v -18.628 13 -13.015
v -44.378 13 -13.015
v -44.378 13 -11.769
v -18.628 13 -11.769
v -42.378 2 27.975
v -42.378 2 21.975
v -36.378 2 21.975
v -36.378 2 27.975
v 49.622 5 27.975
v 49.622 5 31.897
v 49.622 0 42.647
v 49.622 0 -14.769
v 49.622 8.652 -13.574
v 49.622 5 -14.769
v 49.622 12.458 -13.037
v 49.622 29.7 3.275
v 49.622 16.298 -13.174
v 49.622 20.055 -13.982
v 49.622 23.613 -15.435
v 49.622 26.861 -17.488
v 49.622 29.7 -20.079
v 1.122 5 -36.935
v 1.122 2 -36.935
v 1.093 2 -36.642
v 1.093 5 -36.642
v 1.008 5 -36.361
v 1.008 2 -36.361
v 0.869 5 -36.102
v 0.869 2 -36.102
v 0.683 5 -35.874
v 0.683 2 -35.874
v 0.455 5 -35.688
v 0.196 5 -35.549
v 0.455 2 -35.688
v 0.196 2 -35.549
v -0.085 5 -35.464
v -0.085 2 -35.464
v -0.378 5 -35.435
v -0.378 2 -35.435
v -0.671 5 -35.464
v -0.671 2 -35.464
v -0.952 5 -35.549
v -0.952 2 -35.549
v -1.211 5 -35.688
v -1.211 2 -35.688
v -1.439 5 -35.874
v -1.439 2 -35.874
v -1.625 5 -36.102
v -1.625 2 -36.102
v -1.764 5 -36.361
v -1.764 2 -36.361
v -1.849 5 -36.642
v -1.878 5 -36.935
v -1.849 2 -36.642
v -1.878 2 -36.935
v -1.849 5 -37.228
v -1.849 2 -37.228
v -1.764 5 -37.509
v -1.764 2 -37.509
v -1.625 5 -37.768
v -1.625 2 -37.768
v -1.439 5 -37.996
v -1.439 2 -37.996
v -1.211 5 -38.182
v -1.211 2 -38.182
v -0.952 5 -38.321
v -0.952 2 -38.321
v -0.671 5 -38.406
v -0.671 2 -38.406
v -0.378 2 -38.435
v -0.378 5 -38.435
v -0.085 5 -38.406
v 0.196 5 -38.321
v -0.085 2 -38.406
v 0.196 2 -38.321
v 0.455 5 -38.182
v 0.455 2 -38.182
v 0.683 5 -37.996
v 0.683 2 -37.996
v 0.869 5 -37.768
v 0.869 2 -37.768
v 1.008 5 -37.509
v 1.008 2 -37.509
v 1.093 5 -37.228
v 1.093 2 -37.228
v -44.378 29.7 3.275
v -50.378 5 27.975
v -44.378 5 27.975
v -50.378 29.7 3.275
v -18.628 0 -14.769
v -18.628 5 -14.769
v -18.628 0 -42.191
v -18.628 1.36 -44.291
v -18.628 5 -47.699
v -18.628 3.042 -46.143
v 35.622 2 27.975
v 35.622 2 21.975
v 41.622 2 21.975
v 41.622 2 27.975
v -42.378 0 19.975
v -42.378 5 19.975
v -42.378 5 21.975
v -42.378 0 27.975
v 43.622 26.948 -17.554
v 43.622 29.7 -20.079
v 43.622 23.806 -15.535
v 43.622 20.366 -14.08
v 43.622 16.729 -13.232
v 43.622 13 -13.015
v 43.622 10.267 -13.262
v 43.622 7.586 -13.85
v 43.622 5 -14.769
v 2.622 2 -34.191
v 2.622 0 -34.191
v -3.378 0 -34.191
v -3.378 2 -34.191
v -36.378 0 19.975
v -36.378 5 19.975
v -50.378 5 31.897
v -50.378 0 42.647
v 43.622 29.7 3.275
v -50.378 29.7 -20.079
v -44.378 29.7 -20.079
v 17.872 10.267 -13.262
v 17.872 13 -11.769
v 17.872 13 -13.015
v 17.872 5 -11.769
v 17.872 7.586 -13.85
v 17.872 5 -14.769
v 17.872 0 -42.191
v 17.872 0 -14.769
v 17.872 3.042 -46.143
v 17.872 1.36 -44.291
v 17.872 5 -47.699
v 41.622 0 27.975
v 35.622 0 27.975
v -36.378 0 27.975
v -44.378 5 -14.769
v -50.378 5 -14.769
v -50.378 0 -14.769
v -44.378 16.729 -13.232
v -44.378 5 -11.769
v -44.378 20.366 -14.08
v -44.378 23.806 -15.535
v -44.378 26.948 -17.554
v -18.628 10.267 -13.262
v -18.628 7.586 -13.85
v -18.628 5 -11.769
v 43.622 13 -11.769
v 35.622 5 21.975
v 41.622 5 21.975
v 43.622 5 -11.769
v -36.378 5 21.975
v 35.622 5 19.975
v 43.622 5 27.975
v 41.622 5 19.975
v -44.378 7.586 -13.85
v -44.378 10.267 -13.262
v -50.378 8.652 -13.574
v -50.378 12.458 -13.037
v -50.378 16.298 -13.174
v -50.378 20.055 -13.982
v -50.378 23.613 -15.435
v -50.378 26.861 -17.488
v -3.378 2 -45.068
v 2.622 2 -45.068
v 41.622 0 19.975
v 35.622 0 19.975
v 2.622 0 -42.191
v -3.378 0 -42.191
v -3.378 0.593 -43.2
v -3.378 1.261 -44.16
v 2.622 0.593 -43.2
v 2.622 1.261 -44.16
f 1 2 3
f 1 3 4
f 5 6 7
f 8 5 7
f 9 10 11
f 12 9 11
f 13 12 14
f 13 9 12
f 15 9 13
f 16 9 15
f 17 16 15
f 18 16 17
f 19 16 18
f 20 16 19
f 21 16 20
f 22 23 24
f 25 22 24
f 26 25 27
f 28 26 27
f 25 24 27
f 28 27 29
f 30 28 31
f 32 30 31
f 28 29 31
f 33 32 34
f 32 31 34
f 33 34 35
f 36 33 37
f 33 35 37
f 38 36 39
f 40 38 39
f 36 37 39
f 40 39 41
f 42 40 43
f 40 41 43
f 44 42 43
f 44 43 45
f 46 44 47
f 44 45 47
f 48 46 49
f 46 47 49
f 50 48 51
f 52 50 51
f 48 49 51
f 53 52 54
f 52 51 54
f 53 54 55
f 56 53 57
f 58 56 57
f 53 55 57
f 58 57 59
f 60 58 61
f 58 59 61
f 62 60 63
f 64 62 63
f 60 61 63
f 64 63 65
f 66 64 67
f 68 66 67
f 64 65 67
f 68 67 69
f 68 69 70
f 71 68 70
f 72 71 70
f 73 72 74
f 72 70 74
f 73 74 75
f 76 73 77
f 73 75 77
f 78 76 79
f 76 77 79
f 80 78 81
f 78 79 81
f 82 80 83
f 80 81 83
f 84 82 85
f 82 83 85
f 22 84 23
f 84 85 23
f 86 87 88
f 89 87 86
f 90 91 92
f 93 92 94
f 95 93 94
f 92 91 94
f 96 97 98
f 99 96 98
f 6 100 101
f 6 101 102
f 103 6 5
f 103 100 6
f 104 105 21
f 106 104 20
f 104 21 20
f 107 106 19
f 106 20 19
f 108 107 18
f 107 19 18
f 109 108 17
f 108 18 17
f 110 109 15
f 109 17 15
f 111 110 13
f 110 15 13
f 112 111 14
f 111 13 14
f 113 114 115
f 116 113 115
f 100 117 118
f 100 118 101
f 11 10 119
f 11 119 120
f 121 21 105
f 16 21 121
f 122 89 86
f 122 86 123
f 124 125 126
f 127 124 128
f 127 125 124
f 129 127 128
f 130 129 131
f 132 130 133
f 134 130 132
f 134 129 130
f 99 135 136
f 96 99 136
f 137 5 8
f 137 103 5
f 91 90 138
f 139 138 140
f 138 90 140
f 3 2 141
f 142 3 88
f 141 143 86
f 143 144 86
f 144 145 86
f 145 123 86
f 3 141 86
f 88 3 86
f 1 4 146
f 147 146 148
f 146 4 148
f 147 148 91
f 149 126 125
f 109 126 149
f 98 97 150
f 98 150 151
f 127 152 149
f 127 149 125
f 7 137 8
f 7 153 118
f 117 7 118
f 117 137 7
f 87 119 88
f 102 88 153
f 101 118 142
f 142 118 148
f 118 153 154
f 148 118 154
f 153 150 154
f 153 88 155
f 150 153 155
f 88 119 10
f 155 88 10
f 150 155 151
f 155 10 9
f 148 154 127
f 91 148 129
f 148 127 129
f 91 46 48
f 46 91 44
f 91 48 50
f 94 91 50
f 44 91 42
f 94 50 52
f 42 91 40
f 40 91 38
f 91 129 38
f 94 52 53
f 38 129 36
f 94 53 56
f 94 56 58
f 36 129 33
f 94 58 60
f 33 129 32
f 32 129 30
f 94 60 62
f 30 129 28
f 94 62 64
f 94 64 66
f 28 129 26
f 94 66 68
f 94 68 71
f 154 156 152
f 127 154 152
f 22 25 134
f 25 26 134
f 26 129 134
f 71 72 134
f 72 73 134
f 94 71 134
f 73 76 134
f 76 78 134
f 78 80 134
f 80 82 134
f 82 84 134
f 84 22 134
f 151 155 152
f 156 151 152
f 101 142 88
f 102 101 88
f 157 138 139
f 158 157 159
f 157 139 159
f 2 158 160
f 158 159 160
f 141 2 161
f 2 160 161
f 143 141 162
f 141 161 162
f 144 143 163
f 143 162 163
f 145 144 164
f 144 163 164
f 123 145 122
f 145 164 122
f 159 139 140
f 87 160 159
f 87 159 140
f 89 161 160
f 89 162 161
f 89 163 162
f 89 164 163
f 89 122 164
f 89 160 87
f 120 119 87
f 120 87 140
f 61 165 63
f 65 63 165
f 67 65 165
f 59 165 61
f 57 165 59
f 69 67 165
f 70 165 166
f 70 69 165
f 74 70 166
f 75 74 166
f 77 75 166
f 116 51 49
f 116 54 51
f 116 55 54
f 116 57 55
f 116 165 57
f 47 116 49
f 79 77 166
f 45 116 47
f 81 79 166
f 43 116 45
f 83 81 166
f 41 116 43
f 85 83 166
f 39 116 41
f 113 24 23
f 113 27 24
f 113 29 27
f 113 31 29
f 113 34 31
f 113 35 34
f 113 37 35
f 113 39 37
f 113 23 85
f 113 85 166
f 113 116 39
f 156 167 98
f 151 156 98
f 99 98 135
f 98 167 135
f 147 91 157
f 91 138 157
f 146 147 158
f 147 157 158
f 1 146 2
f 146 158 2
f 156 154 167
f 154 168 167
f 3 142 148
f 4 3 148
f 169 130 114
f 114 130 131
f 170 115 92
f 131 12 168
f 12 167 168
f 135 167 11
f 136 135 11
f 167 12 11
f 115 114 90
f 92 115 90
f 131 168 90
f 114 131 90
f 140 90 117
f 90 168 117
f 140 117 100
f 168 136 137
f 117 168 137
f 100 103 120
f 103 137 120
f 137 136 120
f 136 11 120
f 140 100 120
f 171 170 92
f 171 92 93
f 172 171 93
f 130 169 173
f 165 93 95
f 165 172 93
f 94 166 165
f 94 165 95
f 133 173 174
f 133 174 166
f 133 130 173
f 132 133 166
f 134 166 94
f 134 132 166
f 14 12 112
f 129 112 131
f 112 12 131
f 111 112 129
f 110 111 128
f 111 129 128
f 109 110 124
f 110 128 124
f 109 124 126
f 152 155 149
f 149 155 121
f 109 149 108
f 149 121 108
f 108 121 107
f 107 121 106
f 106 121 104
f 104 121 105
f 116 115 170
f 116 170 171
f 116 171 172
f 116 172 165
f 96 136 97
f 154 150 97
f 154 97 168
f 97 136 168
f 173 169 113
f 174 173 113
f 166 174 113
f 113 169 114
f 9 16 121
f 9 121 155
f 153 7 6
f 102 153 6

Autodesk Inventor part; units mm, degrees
ref_plane "YZ Plane" through (0, 0, 0) normal (1, 0, 0) x (0, 1, 0)
ref_plane "XZ Plane" through (0, 0, 0) normal (0, 1, 0) x (-1, 0, 0)
ref_plane "XY Plane" through (0, 0, 0) normal (0, 0, 1) x (1, 0, 0)
sketch "Sketch1" plane through (0, 0, 0) normal (0, 1, 0) x (-1, 0, 0)
  line L0 (-49.6221, -50.9693) -> (50.3779, -50.9693)
  line L1 (50.3779, -50.9693) -> (50.3779, 49.0307)
  line L2 (50.3779, 49.0307) -> (-49.6221, 49.0307)
  line L3 (-49.6221, 49.0307) -> (-49.6221, -50.9693)
  line L4 (-17.8721, -0.5117) -> (18.6279, -0.5117)
  line L5 (18.6279, -0.5117) -> (18.6279, -50.9693)
  line L6 (18.6279, -50.9693) -> (-17.8721, -50.9693)
  line L7 (-17.8721, -50.9693) -> (-17.8721, -0.5117)
  line L8 (-49.6221, -18.7693) -> (50.3779, -18.7693)
  line L9 (50.3779, -18.7693) -> (50.3779, -50.9693)
  line L10 (50.3779, -50.9693) -> (-49.6221, -50.9693)
  line L11 (-49.6221, -50.9693) -> (-49.6221, -18.7693)
  line L12 (-49.6221, -18.7693) -> (50.3779, -18.7693)
  line L13 (50.3779, -18.7693) -> (50.3779, -14.7693)
  line L14 (50.3779, -14.7693) -> (-49.6221, -14.7693)
  line L15 (-49.6221, -14.7693) -> (-49.6221, -18.7693)
  line L16 (-49.6221, -34.8693) -> (50.3779, -34.8693)
  line L17 (-49.6221, -50.9693) -> (50.3779, -50.9693)
  line L18 (50.3779, -50.9693) -> (50.3779, -46.9693)
  line L19 (50.3779, -46.9693) -> (-49.6221, -46.9693)
  line L20 (-49.6221, -46.9693) -> (-49.6221, -50.9693)
  point P0 (0, 0)
  point P1 (0.3779, -50.9693)
  point P2 (0.3779, -50.9693)
  point P3 (0.3779, -50.9693)
  point P4 (-49.6221, -14.7693)
  point P5 (-17.8721, -14.7693)
  point P6 (-17.8721, -46.9693)
  point P7 (18.6279, -46.9693)
  point P8 (18.6279, -14.7693)
  dimension "d0" = 100
  dimension "d1" = 100
  dimension "d2" = 36.5
  dimension "d3" = 100
  dimension "d4" = 32.2
  dimension "d5" = 4
  dimension "d6" = 4
extrude "Extrusion1" add sketch "Sketch1" along normal blind 4 contours L7 L16 L5 L19 | L7 L8 L5 L16 | L7 L14 L5 L8 | L3 L2 L1 L14 L5 L4 L7 | L7 L4 L5 L14
sketch "Sketch2" plane through (17.8721, 0, -14.7693) normal (1, 0, 0) x (0, 0, -1)
  line L0 (0, 0) -> (32.2, 0) projected
  line L1 (32.2, 0) -> (32.2, 4) projected
  line L2 (0, 4) -> (32.2, 4) projected
  line L3 (0, 0) -> (0, 4) projected
  circle A0 centre (20.1, 13.6) radius 16.1 projected
  line L4 (32.2, 0) -> (32.2, 4) projected
  circle A1 centre (20.1, 13.6) radius 15.4457
  point P0 (-14.7693, 0)
  point P1 (27.4219, 0)
extrude "Extrusion2" cut sketch "Sketch2" against normal through all contours A0 L1 L0 | L0 A1 L1 A0
sketch "Sketch3" plane through (0, 0, 0) normal (0, -1, 0) x (1, 0, 0)
  line L0 (-18.6279, -46.9693) -> (-18.6279, -42.1911) projected
  line L1 (17.8721, -46.9693) -> (-18.6279, -46.9693) projected
  line L2 (17.8721, -42.1911) -> (17.8721, -46.9693) projected
  line L3 (-18.6279, -42.1911) -> (17.8721, -42.1911) projected
  line L4 (-18.6279, -42.1911) -> (17.8721, -42.1911) projected
  line L5 (17.8721, -14.7693) -> (17.8721, -42.1911) projected
  line L6 (49.6221, -14.7693) -> (17.8721, -14.7693) projected
  line L7 (49.6221, 49.0307) -> (49.6221, -14.7693) projected
  line L8 (-50.3779, 49.0307) -> (49.6221, 49.0307) projected
  line L9 (-50.3779, -14.7693) -> (-50.3779, 49.0307) projected
  line L10 (-18.6279, -14.7693) -> (-50.3779, -14.7693) projected
  line L11 (-18.6279, -42.1911) -> (-18.6279, -14.7693) projected
  line L12 (17.8721, -46.9693) -> (-18.6279, -46.9693) projected
  line L13 (-18.6279, -42.1911) -> (17.8721, -42.1911) projected
  line L14 (2.6221, -34.1911) -> (-3.3779, -34.1911)
  line L15 (-3.3779, -34.1911) -> (-3.3779, -42.1911)
  line L16 (-3.3779, -42.1911) -> (2.6221, -42.1911)
  line L17 (2.6221, -42.1911) -> (2.6221, -34.1911)
  line L18 (2.6221, -42.1911) -> (-3.3779, -42.1911)
  line L19 (-3.3779, -42.1911) -> (-3.3779, -53.2472)
  line L20 (-3.3779, -53.2472) -> (2.6221, -53.2472)
  line L21 (2.6221, -53.2472) -> (2.6221, -42.1911)
  point P0 (0, 0)
  point P1 (-0.3779, -46.9693)
  point P2 (-0.3779, -42.1911)
  point P3 (-0.3779, -42.1911)
  dimension "d11" = 6
  dimension "d12" = 8
extrude "Extrusion3" cut sketch "Sketch3" against normal blind 2 contours L19 L3 L21 L1 | L1 L21 L20 L19 | L15 L14 L17 L3
sketch "Sketch4" plane through (0, 4, 0) normal (0, 1, 0) x (1, 0, 0)
  line L0 (49.6221, -49.0307) -> (49.6221, 14.7693) projected
  line L1 (49.6221, 14.7693) -> (17.8721, 14.7693) projected
  line L2 (17.8721, 14.7693) -> (17.8721, 46.9693) projected
  line L3 (17.8721, 46.9693) -> (-18.6279, 46.9693) projected
  line L4 (-18.6279, 46.9693) -> (-18.6279, 14.7693) projected
  line L5 (-18.6279, 14.7693) -> (-50.3779, 14.7693) projected
  line L6 (-50.3779, 14.7693) -> (-50.3779, -49.0307) projected
  line L7 (-50.3779, -49.0307) -> (49.6221, -49.0307) projected
  point P0 (0, 0)
extrude "Extrusion4" add sketch "Sketch4" along normal blind 1
sketch "Sketch5" plane through (17.8721, 0, -14.7693) normal (1, 0, 0) x (0, 0, -1)
  arc A0 (27.4219, 0) -> (32.2, 4) centre (20.1, 13.6) ccw projected
  arc A1 (27.4219, 0) -> (32.2, 4) centre (20.1, 13.6) ccw projected
  circle A2 centre (20.1, 13.6) radius 15.4457
  arc A3 (27.4219, 0) -> (32.2, 4) centre (20.1, 13.6) ccw projected
  line L0 (32.2, 4) -> (32.2, 5) projected
  line L1 (0, 5) -> (32.2, 5) projected
  line L2 (0, 0) -> (0, 5) projected
  line L3 (0, 0) -> (27.4219, 0) projected
  line L4 (32.2, 5) -> (32.93, 5)
  point P0 (-14.7693, 0)
  point P1 (32.2, 4)
extrude "Extrusion5" add sketch "Sketch5" against normal up to surface (36.5 mm away) contours L0 L4 A2
sketch "Sketch6" plane through (0, 2, 0) normal (0, -1, 0) x (1, 0, 0)
  line L0 (2.6221, -45.0678) -> (-3.3779, -45.0678) projected
  line L1 (2.6221, -34.1911) -> (2.6221, -45.0678) projected
  line L2 (-3.3779, -34.1911) -> (2.6221, -34.1911) projected
  line L3 (-3.3779, -45.0678) -> (-3.3779, -34.1911) projected
  line L4 (-3.3779, -34.1911) -> (2.6221, -34.1911) projected
  line L5 (-0.3779, -34.1911) -> (-0.3779, -35.8821)
  line L6 (-0.3779, -34.1911) -> (-0.3779, -36.935)
  circle A0 centre (-0.3779, -36.935) radius 1.5
  point P0 (0, 0)
  dimension "d19" = 3
extrude "Extrusion6" cut sketch "Sketch6" against normal blind 10 contours A0
sketch "Sketch7" plane through (49.6221, 0, 49.0307) normal (1, 0, 0) x (0, 0, -1)
  circle A0 centre (83.9, 13.6) radius 16.1 projected
  line L0 (0, 0) -> (63.8, 0) projected
  line L1 (63.8, 0) -> (63.8, 5) projected
  line L2 (0, 5) -> (63.8, 5) projected
  line L3 (0, 0) -> (0, 5) projected
  arc A1 (91.2219, 0) -> (96.73, 5) centre (83.9, 13.6) ccw projected
  line L4 (63.8, 5) -> (96.73, 5) projected
  line L5 (63.8, 0) -> (63.8, 5) projected
  line L6 (63.8, 0) -> (91.2219, 0) projected
  line L7 (0, 0) -> (63.8, 0) projected
  line L8 (0, 0) -> (0, -14.6713)
  line L9 (83.9, -2.5) -> (-11.8385, -2.5)
  line L10 (91.2219, 0) -> (63.8, 0) projected
  line L11 (3.6899, -2.5) -> (17.1336, 5)
  line L12 (0, 5) -> (63.8, 5) projected
  line L13 (17.1336, 5) -> (28.2336, 16.1)
  line L14 (17.1336, 5) -> (32.8313, 5) construction
  line L15 (28.2336, 16.1) -> (29.6478, 14.6857)
  line L16 (29.6478, 14.6857) -> (19.962, 5)
  line L17 (83.9, 29.7) -> (9.0674, 29.7)
  line L18 (29.6478, 14.6857) -> (44.662, 29.7)
  line L19 (63.8, 5) -> (96.73, 5) projected
  circle A2 centre (83.9, 13.6) radius 21.8625
  line L20 (17.1336, 5) -> (1.0083, -2.5)
  point P0 (49.0307, 0)
  point P1 (6.3834, 0)
  dimension "d22" = 45
  dimension "d23" = 2
extrude "Extrusion7" cut sketch "Sketch7" against normal through all contours L20 L0 L3 L2
sketch "Sketch8" plane through (49.6221, 0, -14.7693) normal (1, 0, 0) x (0, 0, -1)
  line L0 (-46.6664, 5) -> (-57.4166, 0) projected
  line L1 (-57.4166, 0) -> (0, 0) projected
  line L2 (0, 0) -> (0, 5) projected
  line L3 (-46.6664, 5) -> (0, 5) projected
  line L4 (0, 5) -> (-46.6664, 5) projected
  line L5 (-45.5728, 5) -> (-39.1497, 11.4231)
  line L6 (-45.5728, 5) -> (-36.4892, 5) construction
  line L7 (-39.1497, 11.4231) -> (-37.7355, 10.0089)
  line L8 (-37.7355, 10.0089) -> (-42.7444, 5)
  line L9 (-42.7444, 5) -> (-5.7272, 42.0172)
  circle A0 centre (20.1, 13.6) radius 16.1 projected
  line L10 (20.1, 29.7) -> (-35.8827, 29.7)
  line L11 (32.93, 5) -> (0, 5) projected
  circle A1 centre (20.1, 13.6) radius 21.8625
  point P0 (-14.7693, 0)
  point P1 (5.3095, 29.7)
  point P2 (-18.0444, 29.7)
  dimension "d26" = 45
  dimension "d27" = 2
extrude "Extrusion8" add sketch "Sketch8" against normal blind 6 contours L8 L9 L10 A1 L3
sketch "Sketch9" plane through (-50.3779, 0, -14.7693) normal (-1, 0, 0) x (0, 0, 1)
  line L0 (57.4166, 0) -> (46.6664, 5) projected
  line L1 (0, 5) -> (46.6664, 5) projected
  line L2 (0, 0) -> (0, 5) projected
  line L3 (0, 0) -> (57.4166, 0) projected
  line L4 (18.0444, 29.7) -> (-5.3095, 29.7) projected
  arc A0 (0, 5) -> (-5.3095, 29.7) centre (-20.1, 13.6) ccw projected
  line L5 (42.7444, 5) -> (0, 5) projected
  line L6 (42.7444, 5) -> (18.0444, 29.7) projected
  point P0 (14.7693, 0)
extrude "Extrusion9" add sketch "Sketch9" against normal blind 6 contours L1 A0 L4 L6
sketch "Sketch10" plane through (0, 5, 0) normal (0, 1, 0) x (1, 0, 0)
  line L0 (-44.3779, -27.9751) -> (-50.3779, -27.9751) projected
  line L1 (-50.3779, -27.9751) -> (-50.3779, -31.8971) projected
  line L2 (-50.3779, -31.8971) -> (49.6221, -31.8971) projected
  line L3 (49.6221, -31.8971) -> (49.6221, -27.9751) projected
  line L4 (49.6221, -27.9751) -> (43.6221, -27.9751) projected
  line L5 (43.6221, -27.9751) -> (43.6221, 14.7693) projected
  line L6 (43.6221, 14.7693) -> (17.8721, 14.7693) projected
  line L7 (17.8721, 14.7693) -> (17.8721, 47.6993) projected
  line L8 (17.8721, 47.6993) -> (-18.6279, 47.6993) projected
  line L9 (-18.6279, 47.6993) -> (-18.6279, 14.7693) projected
  line L10 (-18.6279, 14.7693) -> (-44.3779, 14.7693) projected
  line L11 (-44.3779, 14.7693) -> (-44.3779, -27.9751) projected
  circle A0 centre (-0.3779, 36.935) radius 1.5 projected
  line L12 (43.6221, -27.9751) -> (43.6221, 14.7693) projected
  line L13 (17.8721, 14.7693) -> (43.6221, 14.7693)
  line L14 (43.6221, 14.7693) -> (43.6221, 11.7693)
  line L15 (43.6221, 11.7693) -> (17.8721, 11.7693)
  line L16 (17.8721, 11.7693) -> (17.8721, 14.7693)
  line L17 (-44.3779, 14.7693) -> (-44.3779, -27.9751) projected
  line L18 (-18.6279, 14.7693) -> (-44.3779, 14.7693)
  line L19 (-44.3779, 14.7693) -> (-44.3779, 11.7693)
  line L20 (-44.3779, 11.7693) -> (-18.6279, 11.7693)
  line L21 (-18.6279, 11.7693) -> (-18.6279, 14.7693)
  point P0 (0, 0)
  dimension "d32" = 3
  dimension "d33" = 3
extrude "Extrusion10" add sketch "Sketch10" along normal blind 8 contours L11 L10 L21 L20 | L15 L16 L6 L5
sketch "Sketch11" plane through (-50.3779, 0, -14.7693) normal (-1, 0, 0) x (0, 0, 1)
  arc A0 (0, 5) -> (1.7543, 13) centre (-20.1, 13.6) ccw projected
  line L0 (0, 13) -> (1.7543, 13) projected
  line L1 (0, 5) -> (0, 13) projected
  point P0 (14.7693, 0)
extrude "Extrusion11" cut sketch "Sketch11" against normal through all
sketch "Sketch12" plane through (0, 0, 0) normal (0, -1, 0) x (1, 0, 0)
  line L0 (49.6221, 42.6473) -> (-50.3779, 42.6473) projected
  line L1 (-50.3779, -14.7693) -> (-50.3779, 42.6473) projected
  line L2 (-18.6279, -14.7693) -> (-50.3779, -14.7693) projected
  line L3 (-18.6279, -42.1911) -> (-18.6279, -14.7693) projected
  line L4 (-18.6279, -42.1911) -> (-3.3779, -42.1911) projected
  line L5 (-3.3779, -42.1911) -> (-3.3779, -34.1911) projected
  line L6 (-3.3779, -34.1911) -> (2.6221, -34.1911) projected
  line L7 (2.6221, -34.1911) -> (2.6221, -42.1911) projected
  line L8 (2.6221, -42.1911) -> (17.8721, -42.1911) projected
  line L9 (17.8721, -14.7693) -> (17.8721, -42.1911) projected
  line L10 (49.6221, -14.7693) -> (17.8721, -14.7693) projected
  line L11 (49.6221, 42.6473) -> (49.6221, -14.7693) projected
  circle A0 centre (-0.3779, -36.935) radius 1.5 projected
  line L12 (17.8721, -14.7693) -> (17.8721, -47.6993) projected
  line L13 (17.8721, -47.6993) -> (-18.6279, -47.6993) projected
  line L14 (-18.6279, -47.6993) -> (-18.6279, -14.7693) projected
  line L15 (-18.6279, -14.7693) -> (-18.6279, -11.7693) projected
  line L16 (-18.6279, -11.7693) -> (-44.3779, -11.7693) projected
  line L17 (-44.3779, -11.7693) -> (-44.3779, 27.9751) projected
  line L18 (-44.3779, 27.9751) -> (-50.3779, 27.9751) projected
  line L19 (-50.3779, 27.9751) -> (-50.3779, 31.8971) projected
  line L20 (-50.3779, 31.8971) -> (49.6221, 31.8971) projected
  line L21 (49.6221, 31.8971) -> (49.6221, 27.9751) projected
  line L22 (49.6221, 27.9751) -> (43.6221, 27.9751) projected
  line L23 (43.6221, 27.9751) -> (43.6221, -11.7693) projected
  line L24 (43.6221, -11.7693) -> (17.8721, -11.7693) projected
  line L25 (17.8721, -11.7693) -> (17.8721, -14.7693) projected
  line L26 (-44.3779, -11.7693) -> (-44.3779, 27.9751) projected
  line L27 (-44.3779, 27.9751) -> (-42.3779, 27.9751)
  line L28 (-42.3779, 27.9751) -> (-36.3779, 27.9751)
  line L29 (-36.3779, 27.9751) -> (-36.3779, 19.9751)
  line L30 (-36.3779, 19.9751) -> (-42.3779, 19.9751)
  line L31 (-42.3779, 19.9751) -> (-42.3779, 27.9751)
  line L32 (43.6221, 27.9751) -> (43.6221, -11.7693) projected
  line L33 (43.6221, 27.9751) -> (41.6221, 27.9751)
  line L34 (41.6221, 27.9751) -> (35.6221, 27.9751)
  line L35 (35.6221, 27.9751) -> (35.6221, 19.9751)
  line L36 (35.6221, 19.9751) -> (41.6221, 19.9751)
  line L37 (41.6221, 19.9751) -> (41.6221, 27.9751)
  point P0 (0, 0)
  dimension "d38" = 2
  dimension "d39" = 6
  dimension "d40" = 8
  dimension "d41" = 2
  dimension "d42" = 6
extrude "Extrusion12" cut sketch "Sketch12" against normal blind 2 contours L28 L29 L30 L31 | L37 L36 L35 L34
sketch "Sketch13" plane through (0, 2, 0) normal (0, -1, 0) x (1, 0, 0)
  line L0 (35.6221, 19.9751) -> (35.6221, 27.9751) projected
  line L1 (41.6221, 19.9751) -> (35.6221, 19.9751) projected
  line L2 (41.6221, 27.9751) -> (41.6221, 19.9751) projected
  line L3 (35.6221, 27.9751) -> (41.6221, 27.9751) projected
  line L4 (-36.3779, 19.9751) -> (-42.3779, 19.9751) projected
  line L5 (-36.3779, 27.9751) -> (-36.3779, 19.9751) projected
  line L6 (-42.3779, 27.9751) -> (-36.3779, 27.9751) projected
  line L7 (-42.3779, 19.9751) -> (-42.3779, 27.9751) projected
  line L8 (-36.3779, 27.9751) -> (-36.3779, 19.9751) projected
  line L9 (-42.3779, 19.9751) -> (-36.3779, 19.9751)
  line L10 (-36.3779, 19.9751) -> (-36.3779, 21.9751)
  line L11 (-36.3779, 21.9751) -> (-42.3779, 21.9751)
  line L12 (-42.3779, 21.9751) -> (-42.3779, 19.9751)
  line L13 (41.6221, 27.9751) -> (41.6221, 19.9751) projected
  line L14 (35.6221, 19.9751) -> (35.6221, 27.9751) projected
  line L15 (41.6221, 19.9751) -> (35.6221, 19.9751)
  line L16 (35.6221, 19.9751) -> (35.6221, 21.9751)
  line L17 (35.6221, 21.9751) -> (41.6221, 21.9751)
  line L18 (41.6221, 21.9751) -> (41.6221, 19.9751)
  point P0 (0, 0)
  dimension "d45" = 2
extrude "Extrusion13" cut sketch "Sketch13" against normal through all contours L0 L17 L2 L1 | L4 L7 L11 L5
properties part number "dół"
